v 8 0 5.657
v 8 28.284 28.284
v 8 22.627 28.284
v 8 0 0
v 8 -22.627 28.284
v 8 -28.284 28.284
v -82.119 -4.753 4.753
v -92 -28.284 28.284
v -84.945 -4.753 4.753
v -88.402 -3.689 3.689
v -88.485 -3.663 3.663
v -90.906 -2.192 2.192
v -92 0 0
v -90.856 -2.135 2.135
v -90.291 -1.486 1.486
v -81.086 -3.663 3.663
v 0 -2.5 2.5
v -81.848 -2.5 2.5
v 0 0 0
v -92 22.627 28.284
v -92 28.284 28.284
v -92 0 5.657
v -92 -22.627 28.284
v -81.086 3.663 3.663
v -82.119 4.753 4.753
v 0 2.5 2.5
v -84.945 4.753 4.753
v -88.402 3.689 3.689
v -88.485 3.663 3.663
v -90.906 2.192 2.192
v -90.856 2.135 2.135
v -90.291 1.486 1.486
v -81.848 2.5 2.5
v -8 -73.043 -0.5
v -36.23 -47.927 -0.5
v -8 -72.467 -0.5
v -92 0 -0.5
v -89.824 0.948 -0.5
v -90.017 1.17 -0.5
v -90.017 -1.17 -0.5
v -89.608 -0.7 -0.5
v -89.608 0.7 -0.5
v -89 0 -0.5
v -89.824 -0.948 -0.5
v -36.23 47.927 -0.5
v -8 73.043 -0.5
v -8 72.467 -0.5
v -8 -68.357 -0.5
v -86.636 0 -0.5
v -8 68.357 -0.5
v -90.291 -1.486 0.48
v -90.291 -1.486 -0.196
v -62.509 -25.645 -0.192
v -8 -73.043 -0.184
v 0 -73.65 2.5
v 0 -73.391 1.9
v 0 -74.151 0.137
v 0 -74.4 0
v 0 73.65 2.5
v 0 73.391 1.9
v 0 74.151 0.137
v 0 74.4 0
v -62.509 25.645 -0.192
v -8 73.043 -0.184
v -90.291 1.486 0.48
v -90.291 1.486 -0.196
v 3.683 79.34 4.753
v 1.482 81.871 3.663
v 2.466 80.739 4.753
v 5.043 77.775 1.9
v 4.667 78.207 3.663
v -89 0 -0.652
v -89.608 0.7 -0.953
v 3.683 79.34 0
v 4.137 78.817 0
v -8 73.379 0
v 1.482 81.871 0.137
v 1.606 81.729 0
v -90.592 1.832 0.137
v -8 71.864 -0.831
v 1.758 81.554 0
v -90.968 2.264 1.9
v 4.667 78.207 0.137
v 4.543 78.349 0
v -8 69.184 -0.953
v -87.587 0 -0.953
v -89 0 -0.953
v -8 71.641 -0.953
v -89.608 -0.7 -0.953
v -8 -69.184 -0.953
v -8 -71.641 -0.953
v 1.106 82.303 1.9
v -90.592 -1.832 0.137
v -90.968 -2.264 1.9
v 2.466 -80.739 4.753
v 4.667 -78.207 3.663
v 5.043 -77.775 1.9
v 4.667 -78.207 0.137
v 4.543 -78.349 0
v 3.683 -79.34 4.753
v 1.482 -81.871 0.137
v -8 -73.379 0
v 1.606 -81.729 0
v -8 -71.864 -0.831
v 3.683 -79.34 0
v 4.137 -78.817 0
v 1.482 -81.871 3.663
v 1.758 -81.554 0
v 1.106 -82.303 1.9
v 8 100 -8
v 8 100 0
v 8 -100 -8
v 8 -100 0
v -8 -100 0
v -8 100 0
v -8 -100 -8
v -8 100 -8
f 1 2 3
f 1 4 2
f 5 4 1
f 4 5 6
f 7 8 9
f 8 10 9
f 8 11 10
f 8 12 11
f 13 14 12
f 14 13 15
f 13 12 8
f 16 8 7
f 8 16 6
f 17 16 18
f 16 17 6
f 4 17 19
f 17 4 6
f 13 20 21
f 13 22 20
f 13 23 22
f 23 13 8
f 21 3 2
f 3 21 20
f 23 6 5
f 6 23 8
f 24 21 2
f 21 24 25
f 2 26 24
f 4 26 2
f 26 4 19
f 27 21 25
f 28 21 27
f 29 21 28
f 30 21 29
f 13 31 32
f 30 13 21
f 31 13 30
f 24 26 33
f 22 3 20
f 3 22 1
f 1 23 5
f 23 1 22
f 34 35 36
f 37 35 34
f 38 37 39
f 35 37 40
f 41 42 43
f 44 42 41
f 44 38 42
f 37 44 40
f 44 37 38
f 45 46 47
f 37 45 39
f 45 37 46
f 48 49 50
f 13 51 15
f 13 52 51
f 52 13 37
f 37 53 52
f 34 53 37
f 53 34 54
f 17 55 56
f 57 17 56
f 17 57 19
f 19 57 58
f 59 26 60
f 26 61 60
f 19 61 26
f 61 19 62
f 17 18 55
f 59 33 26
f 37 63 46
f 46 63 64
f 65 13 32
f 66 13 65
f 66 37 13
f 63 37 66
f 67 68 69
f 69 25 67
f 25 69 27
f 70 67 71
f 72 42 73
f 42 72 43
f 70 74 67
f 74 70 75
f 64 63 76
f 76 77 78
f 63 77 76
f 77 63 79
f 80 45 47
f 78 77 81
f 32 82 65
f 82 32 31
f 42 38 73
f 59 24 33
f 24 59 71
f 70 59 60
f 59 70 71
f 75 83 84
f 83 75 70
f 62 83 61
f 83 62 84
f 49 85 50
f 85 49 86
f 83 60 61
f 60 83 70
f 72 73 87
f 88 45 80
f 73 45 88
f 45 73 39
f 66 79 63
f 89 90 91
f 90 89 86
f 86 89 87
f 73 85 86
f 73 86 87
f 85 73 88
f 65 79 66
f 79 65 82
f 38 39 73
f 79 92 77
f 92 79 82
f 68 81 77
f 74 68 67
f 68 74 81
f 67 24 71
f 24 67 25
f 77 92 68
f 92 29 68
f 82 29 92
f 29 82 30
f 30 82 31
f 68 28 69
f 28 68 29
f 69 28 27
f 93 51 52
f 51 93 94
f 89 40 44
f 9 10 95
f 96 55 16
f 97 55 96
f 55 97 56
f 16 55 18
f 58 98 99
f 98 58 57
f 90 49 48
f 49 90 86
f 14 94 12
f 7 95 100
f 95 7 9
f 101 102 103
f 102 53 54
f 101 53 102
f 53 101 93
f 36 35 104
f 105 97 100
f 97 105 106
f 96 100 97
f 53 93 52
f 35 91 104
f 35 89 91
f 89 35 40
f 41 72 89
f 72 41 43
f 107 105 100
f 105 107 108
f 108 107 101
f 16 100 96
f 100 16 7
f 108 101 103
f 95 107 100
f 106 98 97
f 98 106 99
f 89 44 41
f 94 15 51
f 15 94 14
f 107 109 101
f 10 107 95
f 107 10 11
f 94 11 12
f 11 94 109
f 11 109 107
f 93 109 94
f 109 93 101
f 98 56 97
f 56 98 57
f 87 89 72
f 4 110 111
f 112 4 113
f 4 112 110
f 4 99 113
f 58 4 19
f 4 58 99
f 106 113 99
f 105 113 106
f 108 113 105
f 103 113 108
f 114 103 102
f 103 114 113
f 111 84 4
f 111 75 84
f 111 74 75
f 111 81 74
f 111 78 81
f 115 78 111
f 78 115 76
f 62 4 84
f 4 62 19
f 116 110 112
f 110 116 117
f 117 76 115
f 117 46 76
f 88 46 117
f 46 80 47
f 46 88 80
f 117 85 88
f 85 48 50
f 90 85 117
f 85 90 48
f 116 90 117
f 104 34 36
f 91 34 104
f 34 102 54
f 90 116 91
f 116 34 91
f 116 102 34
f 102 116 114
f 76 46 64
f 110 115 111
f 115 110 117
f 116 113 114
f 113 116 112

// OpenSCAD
// current throat is 3 inch
//slider channel is 11.5 inches
//echo(25.4*11.5);    //292 mm
//echo(25.4*3);       //76 mm

//band saw slider guide for holding cylinders

slider_w = 16;
slider_h = 8;
slider_l = 200;
alpha=.9;

throat_slider_distance=92;

//how thick to make V guide? 4 mil?
v_thickness=4;
v_length=40;

v_holder = [[0,0],[0,v_length],[v_length,0]]; // triangle for holder
v_holder_path = [0,1,2]; // triangle paths

translate([8,0,0])
{
rotate([0,-90,0]){
rotate([0,0,-45]){
difference(){
  linear_extrude(height=100){
        polygon(points=v_holder,paths=[v_holder_path]);
        }
    
    translate([v_thickness,v_thickness,-1]){
        cube([v_length,v_length,v_length+200]);
    }
}

    }
}
}

color("purple",alpha)
translate([0,0,-.5]){
    linear_extrude(3){
polygon(points=[[-throat_slider_distance,0],[0,.5*slider_l-20],[0,-.5*slider_l+20]]);
}
}

//rails on stablility trian

color("green")
mirror([0,10,0] ){
translate([-throat_slider_distance+3,0,1.9]){ 
rotate([90,0,49]){
cylinder(h= throat_slider_distance+30 ,r1=3, r2=3);
}
}
}
translate([-throat_slider_distance+3,0,1.9]){ 
rotate([90,0,49]){
cylinder(h= throat_slider_distance+30 ,r1=3, r2=3);
}
}

//
color("cornflowerblue",alpha)
//
translate([0,0,-0.5*slider_h]){
    cube([slider_w ,slider_l ,slider_h],center=true);}
//
